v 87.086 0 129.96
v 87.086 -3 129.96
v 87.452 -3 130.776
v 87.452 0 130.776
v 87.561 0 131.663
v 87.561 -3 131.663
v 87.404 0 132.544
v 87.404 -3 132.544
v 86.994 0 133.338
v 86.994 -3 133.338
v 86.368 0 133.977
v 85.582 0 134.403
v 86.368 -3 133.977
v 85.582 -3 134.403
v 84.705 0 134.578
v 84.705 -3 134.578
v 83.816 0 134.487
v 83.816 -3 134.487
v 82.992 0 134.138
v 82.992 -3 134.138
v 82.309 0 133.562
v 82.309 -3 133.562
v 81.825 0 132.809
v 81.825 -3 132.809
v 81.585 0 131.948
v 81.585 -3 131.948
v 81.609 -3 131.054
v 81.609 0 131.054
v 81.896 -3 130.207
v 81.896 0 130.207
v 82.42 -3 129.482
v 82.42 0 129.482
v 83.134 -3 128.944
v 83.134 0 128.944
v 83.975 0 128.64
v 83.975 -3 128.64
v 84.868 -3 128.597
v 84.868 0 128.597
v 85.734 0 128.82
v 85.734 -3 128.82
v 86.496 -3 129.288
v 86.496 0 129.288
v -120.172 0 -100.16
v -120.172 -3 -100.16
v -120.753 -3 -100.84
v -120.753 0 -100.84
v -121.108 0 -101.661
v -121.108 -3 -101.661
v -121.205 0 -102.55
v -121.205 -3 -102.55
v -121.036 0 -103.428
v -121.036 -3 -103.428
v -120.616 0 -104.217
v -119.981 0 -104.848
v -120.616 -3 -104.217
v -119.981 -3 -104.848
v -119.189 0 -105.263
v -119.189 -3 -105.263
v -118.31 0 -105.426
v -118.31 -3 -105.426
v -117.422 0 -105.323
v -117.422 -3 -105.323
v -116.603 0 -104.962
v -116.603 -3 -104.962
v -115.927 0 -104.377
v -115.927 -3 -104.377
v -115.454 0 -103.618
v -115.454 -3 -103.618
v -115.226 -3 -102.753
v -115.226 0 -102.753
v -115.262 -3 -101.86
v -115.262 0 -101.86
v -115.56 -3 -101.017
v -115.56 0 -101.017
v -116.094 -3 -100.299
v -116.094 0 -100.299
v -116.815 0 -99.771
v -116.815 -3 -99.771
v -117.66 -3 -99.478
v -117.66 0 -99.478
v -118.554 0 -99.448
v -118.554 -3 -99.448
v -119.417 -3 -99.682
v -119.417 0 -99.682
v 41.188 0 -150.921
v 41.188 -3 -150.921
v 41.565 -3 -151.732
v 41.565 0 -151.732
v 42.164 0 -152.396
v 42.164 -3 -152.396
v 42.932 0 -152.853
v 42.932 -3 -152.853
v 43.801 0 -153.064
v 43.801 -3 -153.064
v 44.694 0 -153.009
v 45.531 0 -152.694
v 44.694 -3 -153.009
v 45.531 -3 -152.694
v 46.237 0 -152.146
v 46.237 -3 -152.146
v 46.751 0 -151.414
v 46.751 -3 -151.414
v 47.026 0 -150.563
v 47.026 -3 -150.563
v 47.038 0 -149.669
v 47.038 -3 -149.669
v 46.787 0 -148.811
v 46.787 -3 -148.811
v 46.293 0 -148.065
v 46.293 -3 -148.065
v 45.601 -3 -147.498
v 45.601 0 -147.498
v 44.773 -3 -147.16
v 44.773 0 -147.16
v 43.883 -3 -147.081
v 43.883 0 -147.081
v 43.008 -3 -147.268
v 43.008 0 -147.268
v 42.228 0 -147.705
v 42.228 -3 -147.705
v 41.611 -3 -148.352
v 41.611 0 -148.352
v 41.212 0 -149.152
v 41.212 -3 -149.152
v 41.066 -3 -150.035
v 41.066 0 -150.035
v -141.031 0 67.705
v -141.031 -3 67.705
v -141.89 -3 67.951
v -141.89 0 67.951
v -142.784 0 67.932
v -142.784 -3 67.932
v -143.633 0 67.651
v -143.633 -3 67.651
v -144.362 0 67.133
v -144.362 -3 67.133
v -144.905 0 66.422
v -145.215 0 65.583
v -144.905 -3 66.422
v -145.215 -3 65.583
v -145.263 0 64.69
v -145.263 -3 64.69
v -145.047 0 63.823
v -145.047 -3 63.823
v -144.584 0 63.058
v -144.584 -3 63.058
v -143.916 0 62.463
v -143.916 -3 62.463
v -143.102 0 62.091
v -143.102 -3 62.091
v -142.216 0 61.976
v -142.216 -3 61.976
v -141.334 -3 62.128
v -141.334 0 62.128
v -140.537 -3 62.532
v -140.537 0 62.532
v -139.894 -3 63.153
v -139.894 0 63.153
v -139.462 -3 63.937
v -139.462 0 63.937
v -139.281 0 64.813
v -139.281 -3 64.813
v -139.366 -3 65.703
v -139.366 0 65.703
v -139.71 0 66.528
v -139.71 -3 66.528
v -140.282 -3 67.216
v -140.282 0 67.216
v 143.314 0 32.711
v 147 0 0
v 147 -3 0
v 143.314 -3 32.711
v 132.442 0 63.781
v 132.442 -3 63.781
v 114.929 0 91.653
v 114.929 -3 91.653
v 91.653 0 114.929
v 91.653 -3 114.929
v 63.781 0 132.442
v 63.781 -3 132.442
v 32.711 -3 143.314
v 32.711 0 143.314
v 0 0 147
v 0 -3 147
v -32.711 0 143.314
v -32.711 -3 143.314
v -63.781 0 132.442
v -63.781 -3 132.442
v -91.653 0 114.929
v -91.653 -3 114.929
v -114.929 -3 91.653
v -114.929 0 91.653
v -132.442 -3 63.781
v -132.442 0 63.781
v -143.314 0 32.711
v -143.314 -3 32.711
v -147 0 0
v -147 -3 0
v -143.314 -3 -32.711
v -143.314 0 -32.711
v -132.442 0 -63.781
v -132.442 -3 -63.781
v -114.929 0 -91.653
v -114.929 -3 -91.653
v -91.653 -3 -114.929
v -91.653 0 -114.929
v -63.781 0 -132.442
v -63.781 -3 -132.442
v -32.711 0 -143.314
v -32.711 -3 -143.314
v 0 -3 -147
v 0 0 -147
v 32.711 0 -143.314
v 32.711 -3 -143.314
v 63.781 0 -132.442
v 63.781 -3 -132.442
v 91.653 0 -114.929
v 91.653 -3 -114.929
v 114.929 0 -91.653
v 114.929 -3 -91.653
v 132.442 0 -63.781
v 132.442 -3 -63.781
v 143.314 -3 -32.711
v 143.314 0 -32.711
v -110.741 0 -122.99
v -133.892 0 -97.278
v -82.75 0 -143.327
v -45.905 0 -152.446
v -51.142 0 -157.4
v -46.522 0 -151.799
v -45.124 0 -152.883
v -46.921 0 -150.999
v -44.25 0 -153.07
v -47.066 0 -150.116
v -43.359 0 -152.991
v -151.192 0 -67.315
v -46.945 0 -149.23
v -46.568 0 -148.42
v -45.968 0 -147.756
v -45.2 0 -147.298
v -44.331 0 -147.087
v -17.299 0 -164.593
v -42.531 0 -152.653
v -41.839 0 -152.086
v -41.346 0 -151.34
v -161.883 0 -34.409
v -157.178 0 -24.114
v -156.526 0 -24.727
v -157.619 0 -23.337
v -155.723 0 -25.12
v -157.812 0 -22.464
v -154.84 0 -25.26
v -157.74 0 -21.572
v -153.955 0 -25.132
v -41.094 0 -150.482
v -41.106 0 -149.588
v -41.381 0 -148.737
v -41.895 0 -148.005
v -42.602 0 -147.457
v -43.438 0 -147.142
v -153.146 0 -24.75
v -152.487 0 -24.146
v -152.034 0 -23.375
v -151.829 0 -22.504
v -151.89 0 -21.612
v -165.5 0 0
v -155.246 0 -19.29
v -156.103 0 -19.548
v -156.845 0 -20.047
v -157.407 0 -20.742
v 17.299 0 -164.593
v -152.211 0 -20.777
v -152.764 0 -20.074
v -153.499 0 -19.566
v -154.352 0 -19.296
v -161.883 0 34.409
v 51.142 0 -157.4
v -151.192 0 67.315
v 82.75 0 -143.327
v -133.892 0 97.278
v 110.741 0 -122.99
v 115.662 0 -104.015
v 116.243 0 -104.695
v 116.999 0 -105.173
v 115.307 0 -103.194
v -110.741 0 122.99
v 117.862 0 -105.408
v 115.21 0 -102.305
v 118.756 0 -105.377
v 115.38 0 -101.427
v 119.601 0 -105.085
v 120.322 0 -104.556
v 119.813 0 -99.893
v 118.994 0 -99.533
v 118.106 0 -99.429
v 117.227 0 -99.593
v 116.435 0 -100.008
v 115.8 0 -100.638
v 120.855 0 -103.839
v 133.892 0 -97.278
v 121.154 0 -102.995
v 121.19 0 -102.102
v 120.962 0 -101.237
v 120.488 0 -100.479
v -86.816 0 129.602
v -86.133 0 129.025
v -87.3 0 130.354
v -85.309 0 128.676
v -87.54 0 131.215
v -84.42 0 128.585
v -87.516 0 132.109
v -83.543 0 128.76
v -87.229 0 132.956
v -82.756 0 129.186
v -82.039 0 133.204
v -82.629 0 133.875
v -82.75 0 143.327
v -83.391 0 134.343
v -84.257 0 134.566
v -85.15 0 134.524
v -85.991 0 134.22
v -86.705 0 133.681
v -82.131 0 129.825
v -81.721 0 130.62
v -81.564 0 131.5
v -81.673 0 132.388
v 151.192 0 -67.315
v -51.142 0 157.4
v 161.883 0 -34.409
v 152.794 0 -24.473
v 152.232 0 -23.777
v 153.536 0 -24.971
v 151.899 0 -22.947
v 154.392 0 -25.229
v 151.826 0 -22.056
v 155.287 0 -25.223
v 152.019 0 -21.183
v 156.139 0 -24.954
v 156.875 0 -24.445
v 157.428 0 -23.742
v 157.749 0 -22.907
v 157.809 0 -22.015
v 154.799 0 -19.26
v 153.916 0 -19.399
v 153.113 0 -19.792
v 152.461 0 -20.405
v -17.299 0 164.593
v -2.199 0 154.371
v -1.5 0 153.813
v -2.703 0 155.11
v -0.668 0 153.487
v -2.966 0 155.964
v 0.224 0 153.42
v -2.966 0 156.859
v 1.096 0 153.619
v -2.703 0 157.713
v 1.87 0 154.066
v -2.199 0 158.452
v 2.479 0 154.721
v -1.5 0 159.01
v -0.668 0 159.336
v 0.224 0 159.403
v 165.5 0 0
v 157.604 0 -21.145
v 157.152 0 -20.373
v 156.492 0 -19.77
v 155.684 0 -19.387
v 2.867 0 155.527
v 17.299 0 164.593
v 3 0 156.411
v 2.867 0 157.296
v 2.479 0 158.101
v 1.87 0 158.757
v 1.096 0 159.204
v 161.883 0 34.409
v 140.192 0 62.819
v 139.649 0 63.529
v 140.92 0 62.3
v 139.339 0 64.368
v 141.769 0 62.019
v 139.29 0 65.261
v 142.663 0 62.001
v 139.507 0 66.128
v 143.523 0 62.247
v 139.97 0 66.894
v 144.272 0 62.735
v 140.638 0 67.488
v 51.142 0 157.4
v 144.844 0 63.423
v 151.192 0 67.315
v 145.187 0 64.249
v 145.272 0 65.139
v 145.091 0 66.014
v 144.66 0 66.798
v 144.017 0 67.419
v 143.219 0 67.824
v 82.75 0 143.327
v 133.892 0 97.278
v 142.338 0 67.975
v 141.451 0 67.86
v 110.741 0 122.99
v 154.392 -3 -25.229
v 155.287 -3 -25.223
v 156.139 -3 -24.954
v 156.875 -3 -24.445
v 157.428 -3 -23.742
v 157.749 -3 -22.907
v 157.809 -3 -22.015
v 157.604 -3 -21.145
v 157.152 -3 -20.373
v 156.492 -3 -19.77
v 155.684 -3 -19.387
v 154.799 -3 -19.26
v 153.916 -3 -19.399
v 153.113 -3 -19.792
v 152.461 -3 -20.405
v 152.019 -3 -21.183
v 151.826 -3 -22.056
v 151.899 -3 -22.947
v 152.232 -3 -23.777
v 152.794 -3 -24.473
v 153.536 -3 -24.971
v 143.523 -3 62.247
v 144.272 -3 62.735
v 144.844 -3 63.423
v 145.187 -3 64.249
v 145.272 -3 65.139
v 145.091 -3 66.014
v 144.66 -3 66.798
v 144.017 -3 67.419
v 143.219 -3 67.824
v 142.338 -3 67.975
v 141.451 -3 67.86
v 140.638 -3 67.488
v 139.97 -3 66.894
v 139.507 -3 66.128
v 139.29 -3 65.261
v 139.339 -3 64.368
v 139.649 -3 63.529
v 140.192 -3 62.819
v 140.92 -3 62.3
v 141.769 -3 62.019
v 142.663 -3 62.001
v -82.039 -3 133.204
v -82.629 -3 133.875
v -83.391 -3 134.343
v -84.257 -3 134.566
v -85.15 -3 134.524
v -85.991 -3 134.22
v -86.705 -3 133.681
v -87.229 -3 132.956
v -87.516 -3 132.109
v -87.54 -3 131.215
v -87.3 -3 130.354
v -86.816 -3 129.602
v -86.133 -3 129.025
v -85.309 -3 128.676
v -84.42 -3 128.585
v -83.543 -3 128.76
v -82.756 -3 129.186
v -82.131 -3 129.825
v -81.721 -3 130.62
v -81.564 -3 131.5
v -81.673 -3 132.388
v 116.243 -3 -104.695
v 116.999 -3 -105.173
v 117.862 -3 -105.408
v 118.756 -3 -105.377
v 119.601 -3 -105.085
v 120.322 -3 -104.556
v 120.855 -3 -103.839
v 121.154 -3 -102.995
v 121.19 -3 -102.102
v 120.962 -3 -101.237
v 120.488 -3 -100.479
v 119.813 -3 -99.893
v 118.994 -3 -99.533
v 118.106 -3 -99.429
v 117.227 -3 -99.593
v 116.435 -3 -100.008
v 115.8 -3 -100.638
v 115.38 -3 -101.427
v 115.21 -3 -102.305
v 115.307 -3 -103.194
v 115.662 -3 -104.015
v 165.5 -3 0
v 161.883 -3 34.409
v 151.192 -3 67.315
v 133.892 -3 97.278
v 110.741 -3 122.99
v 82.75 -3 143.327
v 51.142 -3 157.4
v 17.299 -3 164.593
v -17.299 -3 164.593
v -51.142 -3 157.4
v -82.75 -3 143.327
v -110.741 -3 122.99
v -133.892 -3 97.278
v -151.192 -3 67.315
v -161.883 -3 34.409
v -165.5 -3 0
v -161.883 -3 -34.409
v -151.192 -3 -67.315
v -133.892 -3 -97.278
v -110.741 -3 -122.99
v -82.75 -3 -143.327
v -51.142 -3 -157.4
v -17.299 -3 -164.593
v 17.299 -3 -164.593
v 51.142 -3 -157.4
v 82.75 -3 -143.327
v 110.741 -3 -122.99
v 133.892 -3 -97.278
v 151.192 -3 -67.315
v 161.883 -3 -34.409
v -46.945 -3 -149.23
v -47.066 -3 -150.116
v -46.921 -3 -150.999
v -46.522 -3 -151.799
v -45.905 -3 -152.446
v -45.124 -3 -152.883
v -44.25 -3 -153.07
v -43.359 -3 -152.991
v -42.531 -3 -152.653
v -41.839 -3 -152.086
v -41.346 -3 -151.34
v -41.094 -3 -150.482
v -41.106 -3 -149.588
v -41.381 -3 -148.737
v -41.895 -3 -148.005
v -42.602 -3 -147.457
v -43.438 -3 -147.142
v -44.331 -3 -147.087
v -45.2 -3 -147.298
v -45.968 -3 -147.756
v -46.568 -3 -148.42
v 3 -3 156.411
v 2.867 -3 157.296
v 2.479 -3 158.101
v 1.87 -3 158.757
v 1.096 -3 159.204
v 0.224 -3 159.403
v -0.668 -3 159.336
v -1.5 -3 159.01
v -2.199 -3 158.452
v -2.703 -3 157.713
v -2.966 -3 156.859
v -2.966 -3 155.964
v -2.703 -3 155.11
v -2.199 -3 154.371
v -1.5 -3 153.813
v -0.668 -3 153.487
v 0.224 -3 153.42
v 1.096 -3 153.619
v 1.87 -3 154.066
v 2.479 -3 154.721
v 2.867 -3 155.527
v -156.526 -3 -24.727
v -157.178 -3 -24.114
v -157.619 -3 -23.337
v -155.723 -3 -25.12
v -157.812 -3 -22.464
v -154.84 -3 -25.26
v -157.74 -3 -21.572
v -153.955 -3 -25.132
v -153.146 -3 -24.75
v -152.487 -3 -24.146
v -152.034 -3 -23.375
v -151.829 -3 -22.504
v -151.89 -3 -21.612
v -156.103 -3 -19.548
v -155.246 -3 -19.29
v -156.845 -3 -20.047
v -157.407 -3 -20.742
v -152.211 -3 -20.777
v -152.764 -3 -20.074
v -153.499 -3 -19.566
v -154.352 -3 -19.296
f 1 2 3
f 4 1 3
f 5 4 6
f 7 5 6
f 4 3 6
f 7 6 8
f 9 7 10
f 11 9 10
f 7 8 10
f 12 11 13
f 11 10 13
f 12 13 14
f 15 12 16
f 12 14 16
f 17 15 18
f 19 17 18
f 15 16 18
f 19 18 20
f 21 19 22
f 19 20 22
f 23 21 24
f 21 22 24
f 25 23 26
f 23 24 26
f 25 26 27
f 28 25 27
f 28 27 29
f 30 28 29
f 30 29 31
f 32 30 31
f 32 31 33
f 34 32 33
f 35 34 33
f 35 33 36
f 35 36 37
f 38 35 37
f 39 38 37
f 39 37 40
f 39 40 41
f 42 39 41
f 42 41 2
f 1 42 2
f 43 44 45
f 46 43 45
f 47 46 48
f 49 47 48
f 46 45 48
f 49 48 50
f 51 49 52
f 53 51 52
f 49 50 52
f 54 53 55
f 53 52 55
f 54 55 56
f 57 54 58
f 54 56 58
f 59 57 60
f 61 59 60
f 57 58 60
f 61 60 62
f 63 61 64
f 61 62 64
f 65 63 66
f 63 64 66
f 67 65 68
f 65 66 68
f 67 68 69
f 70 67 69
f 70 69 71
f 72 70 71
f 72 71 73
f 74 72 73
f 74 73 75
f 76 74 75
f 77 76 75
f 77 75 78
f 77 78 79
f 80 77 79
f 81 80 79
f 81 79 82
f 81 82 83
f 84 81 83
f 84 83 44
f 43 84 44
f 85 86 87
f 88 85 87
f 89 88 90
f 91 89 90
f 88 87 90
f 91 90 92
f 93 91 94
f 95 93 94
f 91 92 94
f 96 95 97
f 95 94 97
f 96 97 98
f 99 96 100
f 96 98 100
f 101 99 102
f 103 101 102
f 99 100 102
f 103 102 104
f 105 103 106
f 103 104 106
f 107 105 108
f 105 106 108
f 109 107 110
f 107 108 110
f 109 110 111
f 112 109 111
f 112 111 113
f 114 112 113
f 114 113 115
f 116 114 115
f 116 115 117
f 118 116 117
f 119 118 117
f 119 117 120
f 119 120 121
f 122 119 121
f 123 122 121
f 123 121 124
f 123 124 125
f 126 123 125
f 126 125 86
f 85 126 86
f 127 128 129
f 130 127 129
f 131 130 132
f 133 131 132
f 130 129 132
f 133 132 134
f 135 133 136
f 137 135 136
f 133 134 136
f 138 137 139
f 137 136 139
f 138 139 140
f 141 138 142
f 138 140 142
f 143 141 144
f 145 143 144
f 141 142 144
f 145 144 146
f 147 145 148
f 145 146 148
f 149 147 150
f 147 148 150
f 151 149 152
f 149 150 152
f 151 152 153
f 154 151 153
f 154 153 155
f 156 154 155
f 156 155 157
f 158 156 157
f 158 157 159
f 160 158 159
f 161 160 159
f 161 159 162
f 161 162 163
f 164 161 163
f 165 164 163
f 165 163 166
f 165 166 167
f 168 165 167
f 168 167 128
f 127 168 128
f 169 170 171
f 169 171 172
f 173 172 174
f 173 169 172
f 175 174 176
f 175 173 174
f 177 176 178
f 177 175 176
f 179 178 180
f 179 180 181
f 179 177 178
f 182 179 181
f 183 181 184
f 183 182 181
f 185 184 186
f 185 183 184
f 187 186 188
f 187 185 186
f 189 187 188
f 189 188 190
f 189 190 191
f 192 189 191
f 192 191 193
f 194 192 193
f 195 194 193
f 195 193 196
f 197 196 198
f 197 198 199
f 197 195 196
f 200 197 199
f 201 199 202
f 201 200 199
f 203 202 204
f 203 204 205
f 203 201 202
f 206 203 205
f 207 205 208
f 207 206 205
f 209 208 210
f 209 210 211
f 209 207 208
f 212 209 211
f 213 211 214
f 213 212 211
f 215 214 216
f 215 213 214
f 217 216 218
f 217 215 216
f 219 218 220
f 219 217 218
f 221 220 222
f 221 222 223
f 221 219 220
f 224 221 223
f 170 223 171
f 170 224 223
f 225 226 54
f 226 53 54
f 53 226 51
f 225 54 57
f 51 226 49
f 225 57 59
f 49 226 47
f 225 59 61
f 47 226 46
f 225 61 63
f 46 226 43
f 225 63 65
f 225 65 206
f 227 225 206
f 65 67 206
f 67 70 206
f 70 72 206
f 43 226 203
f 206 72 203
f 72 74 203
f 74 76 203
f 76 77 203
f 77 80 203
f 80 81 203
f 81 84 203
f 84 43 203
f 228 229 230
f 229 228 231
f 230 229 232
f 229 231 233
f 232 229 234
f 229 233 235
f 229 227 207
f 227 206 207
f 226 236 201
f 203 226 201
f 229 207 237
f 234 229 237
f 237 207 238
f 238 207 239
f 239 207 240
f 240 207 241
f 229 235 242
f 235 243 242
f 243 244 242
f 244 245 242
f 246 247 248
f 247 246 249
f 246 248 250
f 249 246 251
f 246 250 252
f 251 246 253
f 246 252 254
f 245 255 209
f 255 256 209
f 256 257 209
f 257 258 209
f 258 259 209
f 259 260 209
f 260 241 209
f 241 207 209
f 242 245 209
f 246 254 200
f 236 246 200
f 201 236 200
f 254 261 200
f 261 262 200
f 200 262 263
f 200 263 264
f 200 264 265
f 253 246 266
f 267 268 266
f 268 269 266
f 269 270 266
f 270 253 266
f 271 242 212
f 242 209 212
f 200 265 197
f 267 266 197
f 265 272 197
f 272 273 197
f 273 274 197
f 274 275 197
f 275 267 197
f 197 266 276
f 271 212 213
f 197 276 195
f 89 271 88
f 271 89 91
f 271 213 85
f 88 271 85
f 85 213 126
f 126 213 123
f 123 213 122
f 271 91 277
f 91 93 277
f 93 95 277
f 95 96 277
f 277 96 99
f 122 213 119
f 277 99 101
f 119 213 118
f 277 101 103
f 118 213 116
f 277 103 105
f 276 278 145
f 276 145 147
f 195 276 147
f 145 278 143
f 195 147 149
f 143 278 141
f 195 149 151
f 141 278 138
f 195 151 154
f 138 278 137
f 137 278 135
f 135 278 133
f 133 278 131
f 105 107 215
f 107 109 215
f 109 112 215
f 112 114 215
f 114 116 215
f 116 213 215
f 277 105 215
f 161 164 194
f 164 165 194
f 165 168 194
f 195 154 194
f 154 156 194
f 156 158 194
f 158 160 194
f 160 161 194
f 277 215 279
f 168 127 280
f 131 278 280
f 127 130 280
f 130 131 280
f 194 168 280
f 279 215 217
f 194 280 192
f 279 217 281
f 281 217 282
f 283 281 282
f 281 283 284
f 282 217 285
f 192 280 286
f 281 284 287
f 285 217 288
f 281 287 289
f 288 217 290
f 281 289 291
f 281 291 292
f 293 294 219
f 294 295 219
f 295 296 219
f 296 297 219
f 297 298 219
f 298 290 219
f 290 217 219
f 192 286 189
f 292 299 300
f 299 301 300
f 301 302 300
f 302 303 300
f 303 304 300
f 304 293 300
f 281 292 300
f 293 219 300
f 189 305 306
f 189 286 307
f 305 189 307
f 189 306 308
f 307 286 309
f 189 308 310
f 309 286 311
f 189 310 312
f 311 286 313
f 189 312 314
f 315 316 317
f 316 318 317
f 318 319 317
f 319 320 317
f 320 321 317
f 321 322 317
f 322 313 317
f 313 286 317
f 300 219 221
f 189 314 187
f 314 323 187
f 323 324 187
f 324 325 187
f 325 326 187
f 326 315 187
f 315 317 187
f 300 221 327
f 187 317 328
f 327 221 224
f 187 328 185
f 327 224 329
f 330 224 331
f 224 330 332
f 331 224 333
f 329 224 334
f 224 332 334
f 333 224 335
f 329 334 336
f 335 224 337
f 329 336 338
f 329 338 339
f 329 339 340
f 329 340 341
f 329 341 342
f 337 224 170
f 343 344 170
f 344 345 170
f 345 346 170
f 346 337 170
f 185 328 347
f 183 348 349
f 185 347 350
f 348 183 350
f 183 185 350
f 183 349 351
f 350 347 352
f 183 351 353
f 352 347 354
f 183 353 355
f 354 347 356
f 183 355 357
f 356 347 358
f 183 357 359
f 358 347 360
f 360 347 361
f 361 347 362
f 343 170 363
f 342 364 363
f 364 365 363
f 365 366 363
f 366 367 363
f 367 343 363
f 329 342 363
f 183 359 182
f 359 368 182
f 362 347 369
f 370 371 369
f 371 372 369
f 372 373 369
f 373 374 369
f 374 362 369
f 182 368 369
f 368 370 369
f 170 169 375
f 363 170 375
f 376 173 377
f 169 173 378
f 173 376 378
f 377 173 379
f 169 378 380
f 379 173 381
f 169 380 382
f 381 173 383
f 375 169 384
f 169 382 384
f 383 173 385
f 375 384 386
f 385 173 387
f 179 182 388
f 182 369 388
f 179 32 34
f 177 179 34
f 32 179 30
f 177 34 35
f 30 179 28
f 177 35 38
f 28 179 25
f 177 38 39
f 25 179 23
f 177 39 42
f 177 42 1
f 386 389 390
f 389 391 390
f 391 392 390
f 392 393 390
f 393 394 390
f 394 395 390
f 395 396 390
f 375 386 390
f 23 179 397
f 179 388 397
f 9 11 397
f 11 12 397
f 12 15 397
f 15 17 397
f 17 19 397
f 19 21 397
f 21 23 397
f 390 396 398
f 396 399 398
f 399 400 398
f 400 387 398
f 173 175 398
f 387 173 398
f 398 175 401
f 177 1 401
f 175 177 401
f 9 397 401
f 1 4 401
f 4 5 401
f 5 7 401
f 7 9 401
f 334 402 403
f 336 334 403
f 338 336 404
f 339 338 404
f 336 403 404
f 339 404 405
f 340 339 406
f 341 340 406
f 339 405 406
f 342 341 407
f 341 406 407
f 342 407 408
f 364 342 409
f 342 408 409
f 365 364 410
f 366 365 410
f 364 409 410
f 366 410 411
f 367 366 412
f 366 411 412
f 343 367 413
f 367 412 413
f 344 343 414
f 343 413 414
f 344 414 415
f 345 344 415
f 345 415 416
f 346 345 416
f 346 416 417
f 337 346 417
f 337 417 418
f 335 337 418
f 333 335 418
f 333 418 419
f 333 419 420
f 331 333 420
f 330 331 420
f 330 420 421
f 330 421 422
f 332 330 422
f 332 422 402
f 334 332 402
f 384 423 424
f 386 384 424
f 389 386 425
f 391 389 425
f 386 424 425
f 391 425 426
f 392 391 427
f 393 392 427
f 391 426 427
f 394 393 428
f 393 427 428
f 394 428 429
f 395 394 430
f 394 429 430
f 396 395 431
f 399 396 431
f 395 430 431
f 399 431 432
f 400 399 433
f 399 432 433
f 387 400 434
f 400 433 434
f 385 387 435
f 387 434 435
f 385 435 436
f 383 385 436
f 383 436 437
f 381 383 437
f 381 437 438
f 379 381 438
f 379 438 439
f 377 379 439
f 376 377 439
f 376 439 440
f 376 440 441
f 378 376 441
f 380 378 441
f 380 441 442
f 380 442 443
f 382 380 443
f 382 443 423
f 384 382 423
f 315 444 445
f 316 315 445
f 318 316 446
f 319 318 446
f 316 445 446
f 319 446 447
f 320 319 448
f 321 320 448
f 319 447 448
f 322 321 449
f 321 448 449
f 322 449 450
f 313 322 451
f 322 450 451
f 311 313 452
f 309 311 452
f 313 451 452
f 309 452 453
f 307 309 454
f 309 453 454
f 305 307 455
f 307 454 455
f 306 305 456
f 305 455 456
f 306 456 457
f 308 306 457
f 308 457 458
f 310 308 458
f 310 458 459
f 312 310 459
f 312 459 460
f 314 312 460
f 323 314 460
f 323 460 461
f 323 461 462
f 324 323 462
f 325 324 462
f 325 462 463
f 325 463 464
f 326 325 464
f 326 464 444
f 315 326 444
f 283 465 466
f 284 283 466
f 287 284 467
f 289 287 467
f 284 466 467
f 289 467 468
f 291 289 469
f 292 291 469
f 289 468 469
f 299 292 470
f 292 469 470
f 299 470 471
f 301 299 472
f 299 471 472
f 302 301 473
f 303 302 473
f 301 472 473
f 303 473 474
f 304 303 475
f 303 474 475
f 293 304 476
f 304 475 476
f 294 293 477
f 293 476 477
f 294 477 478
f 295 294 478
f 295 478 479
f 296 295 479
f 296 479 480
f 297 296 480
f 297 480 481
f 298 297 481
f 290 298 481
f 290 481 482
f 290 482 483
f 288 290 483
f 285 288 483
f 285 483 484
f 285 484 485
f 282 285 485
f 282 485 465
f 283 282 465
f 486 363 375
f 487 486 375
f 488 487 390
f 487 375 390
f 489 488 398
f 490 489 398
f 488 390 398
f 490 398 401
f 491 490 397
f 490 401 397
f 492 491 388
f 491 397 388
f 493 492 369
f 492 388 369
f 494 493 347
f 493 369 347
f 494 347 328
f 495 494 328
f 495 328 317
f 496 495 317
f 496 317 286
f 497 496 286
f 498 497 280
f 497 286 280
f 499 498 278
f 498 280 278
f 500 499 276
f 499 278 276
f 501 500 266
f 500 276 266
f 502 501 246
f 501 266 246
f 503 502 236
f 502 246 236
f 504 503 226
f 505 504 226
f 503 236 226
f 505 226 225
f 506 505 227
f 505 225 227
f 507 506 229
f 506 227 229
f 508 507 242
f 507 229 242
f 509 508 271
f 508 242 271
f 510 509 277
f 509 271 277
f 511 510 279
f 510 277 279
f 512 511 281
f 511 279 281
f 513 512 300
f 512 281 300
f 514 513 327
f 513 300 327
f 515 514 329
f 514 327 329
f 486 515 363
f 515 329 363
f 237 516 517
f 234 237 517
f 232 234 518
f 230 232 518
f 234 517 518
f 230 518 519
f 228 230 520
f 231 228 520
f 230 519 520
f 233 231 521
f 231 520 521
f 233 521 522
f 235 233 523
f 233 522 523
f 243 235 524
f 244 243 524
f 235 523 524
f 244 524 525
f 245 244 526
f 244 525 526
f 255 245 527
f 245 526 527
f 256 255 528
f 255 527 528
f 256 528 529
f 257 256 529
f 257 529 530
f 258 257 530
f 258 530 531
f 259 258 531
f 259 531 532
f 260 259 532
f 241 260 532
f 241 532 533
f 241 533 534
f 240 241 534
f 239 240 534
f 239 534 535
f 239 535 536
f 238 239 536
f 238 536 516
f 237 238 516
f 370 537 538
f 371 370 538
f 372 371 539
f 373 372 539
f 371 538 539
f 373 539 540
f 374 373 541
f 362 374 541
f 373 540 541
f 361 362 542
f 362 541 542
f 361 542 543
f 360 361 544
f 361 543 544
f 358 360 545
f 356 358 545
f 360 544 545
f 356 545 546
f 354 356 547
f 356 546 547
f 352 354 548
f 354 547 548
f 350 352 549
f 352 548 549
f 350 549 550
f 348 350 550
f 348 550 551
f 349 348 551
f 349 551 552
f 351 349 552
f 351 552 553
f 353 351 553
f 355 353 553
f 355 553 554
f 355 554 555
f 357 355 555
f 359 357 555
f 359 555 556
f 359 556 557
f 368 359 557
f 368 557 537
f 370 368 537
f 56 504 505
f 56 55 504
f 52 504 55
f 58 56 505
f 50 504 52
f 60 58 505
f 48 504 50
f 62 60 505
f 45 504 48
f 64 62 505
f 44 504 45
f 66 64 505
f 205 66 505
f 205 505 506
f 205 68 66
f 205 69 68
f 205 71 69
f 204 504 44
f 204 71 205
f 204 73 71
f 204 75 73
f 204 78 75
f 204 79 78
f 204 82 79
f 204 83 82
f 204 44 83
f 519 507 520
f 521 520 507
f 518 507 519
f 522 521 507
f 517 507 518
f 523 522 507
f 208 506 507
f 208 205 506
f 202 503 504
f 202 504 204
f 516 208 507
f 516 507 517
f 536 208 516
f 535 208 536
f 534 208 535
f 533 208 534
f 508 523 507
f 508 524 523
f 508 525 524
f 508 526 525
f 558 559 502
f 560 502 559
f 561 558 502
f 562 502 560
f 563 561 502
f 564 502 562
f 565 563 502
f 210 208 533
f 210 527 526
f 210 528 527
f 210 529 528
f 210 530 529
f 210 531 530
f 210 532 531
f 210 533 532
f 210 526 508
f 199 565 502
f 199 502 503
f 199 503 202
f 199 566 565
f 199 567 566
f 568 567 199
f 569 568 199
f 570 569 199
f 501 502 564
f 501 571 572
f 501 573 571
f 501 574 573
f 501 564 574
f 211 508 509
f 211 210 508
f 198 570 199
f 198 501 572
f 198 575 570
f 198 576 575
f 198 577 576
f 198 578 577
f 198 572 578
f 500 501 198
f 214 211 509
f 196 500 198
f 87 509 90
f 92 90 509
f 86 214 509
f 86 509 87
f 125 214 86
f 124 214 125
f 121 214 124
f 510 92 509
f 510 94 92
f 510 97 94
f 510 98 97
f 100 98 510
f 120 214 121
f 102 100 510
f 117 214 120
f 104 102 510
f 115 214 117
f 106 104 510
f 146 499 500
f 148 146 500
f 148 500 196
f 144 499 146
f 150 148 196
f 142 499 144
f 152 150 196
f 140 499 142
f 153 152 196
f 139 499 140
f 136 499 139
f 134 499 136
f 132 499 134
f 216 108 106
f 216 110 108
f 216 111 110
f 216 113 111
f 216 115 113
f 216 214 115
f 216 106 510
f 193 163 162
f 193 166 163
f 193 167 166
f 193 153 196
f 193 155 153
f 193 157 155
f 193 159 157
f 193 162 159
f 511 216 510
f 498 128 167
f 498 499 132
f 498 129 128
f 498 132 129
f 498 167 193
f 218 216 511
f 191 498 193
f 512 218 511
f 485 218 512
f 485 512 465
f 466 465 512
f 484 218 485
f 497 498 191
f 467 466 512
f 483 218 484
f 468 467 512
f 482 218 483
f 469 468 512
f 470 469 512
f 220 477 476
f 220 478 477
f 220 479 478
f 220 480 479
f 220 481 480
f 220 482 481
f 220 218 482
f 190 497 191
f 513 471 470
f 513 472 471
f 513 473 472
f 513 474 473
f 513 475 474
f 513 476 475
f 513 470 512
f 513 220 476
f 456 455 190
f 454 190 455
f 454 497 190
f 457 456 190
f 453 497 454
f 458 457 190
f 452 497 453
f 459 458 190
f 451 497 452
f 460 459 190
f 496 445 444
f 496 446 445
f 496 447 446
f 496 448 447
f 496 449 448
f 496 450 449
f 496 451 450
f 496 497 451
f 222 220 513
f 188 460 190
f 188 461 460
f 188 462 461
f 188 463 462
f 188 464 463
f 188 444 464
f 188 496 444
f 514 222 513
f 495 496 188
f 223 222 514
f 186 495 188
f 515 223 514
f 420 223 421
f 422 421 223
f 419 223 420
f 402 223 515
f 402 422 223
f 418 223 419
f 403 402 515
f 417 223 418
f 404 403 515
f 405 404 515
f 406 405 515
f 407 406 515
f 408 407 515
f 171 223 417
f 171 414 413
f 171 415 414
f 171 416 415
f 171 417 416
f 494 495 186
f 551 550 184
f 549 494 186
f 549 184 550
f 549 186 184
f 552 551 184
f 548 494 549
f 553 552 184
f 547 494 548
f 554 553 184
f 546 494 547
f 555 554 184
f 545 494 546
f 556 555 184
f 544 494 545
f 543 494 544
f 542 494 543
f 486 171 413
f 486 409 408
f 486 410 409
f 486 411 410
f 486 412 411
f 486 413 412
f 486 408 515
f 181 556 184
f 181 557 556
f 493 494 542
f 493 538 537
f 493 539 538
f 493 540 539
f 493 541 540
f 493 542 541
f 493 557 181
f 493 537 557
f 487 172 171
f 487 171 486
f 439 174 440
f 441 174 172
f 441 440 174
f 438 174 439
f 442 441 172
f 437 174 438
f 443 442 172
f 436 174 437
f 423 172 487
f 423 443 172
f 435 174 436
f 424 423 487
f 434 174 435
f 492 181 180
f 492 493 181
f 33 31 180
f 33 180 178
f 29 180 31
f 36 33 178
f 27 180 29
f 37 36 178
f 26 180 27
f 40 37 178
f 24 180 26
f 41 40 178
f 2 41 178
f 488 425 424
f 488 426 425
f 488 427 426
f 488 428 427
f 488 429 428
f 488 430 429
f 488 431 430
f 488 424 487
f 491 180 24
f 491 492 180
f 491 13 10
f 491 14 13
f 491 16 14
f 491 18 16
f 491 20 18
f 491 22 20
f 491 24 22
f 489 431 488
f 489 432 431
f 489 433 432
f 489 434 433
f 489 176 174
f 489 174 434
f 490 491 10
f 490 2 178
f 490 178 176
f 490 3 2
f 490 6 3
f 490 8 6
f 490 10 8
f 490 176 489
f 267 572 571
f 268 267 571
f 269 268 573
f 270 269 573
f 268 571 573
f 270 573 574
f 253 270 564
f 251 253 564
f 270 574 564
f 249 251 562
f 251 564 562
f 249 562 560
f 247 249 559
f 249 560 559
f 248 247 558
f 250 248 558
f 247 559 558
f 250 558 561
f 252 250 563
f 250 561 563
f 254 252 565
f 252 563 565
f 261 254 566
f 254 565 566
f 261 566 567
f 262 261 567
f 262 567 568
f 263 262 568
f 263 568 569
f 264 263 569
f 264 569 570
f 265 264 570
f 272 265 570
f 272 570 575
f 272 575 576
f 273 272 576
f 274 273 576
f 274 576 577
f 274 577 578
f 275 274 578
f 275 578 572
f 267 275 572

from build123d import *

# Parameters (mm, degrees)
F0_R            = 165.5
F0_R_2          = 147
F1_DEPTH        = 3
F2_R            = 3
F3_DEPTH        = 25
F3_COPIES_COUNT = 11


# Not quite as in the source:
# - a pattern or mirror of a feature is missing from the dataset's text; its kind, count and spacing are read off the source's solid


with BuildPart() as f1:
    # F0 (on Front) → F1 (new body)
    with BuildSketch(Plane.XZ):
        Circle(F0_R)
        Circle(F0_R_2, mode=Mode.SUBTRACT)
    extrude(amount=F1_DEPTH)

    # F2 (on face) → F3 (cut)
    with BuildSketch(Plane.XZ.offset(3)):
        with Locations((0, 156.4114242792)):
            Circle(F2_R)
    f3 = extrude(amount=-F3_DEPTH, mode=Mode.SUBTRACT)

    # F3_copies: F3 ×11 about axis
    f3_copies_axis = Axis((0, 0, 0), (0, 1, 0))
    for i in range(1, F3_COPIES_COUNT):
        add(f3.rotate(f3_copies_axis, i * 360 / F3_COPIES_COUNT), mode=Mode.SUBTRACT)


solid = f1.part
